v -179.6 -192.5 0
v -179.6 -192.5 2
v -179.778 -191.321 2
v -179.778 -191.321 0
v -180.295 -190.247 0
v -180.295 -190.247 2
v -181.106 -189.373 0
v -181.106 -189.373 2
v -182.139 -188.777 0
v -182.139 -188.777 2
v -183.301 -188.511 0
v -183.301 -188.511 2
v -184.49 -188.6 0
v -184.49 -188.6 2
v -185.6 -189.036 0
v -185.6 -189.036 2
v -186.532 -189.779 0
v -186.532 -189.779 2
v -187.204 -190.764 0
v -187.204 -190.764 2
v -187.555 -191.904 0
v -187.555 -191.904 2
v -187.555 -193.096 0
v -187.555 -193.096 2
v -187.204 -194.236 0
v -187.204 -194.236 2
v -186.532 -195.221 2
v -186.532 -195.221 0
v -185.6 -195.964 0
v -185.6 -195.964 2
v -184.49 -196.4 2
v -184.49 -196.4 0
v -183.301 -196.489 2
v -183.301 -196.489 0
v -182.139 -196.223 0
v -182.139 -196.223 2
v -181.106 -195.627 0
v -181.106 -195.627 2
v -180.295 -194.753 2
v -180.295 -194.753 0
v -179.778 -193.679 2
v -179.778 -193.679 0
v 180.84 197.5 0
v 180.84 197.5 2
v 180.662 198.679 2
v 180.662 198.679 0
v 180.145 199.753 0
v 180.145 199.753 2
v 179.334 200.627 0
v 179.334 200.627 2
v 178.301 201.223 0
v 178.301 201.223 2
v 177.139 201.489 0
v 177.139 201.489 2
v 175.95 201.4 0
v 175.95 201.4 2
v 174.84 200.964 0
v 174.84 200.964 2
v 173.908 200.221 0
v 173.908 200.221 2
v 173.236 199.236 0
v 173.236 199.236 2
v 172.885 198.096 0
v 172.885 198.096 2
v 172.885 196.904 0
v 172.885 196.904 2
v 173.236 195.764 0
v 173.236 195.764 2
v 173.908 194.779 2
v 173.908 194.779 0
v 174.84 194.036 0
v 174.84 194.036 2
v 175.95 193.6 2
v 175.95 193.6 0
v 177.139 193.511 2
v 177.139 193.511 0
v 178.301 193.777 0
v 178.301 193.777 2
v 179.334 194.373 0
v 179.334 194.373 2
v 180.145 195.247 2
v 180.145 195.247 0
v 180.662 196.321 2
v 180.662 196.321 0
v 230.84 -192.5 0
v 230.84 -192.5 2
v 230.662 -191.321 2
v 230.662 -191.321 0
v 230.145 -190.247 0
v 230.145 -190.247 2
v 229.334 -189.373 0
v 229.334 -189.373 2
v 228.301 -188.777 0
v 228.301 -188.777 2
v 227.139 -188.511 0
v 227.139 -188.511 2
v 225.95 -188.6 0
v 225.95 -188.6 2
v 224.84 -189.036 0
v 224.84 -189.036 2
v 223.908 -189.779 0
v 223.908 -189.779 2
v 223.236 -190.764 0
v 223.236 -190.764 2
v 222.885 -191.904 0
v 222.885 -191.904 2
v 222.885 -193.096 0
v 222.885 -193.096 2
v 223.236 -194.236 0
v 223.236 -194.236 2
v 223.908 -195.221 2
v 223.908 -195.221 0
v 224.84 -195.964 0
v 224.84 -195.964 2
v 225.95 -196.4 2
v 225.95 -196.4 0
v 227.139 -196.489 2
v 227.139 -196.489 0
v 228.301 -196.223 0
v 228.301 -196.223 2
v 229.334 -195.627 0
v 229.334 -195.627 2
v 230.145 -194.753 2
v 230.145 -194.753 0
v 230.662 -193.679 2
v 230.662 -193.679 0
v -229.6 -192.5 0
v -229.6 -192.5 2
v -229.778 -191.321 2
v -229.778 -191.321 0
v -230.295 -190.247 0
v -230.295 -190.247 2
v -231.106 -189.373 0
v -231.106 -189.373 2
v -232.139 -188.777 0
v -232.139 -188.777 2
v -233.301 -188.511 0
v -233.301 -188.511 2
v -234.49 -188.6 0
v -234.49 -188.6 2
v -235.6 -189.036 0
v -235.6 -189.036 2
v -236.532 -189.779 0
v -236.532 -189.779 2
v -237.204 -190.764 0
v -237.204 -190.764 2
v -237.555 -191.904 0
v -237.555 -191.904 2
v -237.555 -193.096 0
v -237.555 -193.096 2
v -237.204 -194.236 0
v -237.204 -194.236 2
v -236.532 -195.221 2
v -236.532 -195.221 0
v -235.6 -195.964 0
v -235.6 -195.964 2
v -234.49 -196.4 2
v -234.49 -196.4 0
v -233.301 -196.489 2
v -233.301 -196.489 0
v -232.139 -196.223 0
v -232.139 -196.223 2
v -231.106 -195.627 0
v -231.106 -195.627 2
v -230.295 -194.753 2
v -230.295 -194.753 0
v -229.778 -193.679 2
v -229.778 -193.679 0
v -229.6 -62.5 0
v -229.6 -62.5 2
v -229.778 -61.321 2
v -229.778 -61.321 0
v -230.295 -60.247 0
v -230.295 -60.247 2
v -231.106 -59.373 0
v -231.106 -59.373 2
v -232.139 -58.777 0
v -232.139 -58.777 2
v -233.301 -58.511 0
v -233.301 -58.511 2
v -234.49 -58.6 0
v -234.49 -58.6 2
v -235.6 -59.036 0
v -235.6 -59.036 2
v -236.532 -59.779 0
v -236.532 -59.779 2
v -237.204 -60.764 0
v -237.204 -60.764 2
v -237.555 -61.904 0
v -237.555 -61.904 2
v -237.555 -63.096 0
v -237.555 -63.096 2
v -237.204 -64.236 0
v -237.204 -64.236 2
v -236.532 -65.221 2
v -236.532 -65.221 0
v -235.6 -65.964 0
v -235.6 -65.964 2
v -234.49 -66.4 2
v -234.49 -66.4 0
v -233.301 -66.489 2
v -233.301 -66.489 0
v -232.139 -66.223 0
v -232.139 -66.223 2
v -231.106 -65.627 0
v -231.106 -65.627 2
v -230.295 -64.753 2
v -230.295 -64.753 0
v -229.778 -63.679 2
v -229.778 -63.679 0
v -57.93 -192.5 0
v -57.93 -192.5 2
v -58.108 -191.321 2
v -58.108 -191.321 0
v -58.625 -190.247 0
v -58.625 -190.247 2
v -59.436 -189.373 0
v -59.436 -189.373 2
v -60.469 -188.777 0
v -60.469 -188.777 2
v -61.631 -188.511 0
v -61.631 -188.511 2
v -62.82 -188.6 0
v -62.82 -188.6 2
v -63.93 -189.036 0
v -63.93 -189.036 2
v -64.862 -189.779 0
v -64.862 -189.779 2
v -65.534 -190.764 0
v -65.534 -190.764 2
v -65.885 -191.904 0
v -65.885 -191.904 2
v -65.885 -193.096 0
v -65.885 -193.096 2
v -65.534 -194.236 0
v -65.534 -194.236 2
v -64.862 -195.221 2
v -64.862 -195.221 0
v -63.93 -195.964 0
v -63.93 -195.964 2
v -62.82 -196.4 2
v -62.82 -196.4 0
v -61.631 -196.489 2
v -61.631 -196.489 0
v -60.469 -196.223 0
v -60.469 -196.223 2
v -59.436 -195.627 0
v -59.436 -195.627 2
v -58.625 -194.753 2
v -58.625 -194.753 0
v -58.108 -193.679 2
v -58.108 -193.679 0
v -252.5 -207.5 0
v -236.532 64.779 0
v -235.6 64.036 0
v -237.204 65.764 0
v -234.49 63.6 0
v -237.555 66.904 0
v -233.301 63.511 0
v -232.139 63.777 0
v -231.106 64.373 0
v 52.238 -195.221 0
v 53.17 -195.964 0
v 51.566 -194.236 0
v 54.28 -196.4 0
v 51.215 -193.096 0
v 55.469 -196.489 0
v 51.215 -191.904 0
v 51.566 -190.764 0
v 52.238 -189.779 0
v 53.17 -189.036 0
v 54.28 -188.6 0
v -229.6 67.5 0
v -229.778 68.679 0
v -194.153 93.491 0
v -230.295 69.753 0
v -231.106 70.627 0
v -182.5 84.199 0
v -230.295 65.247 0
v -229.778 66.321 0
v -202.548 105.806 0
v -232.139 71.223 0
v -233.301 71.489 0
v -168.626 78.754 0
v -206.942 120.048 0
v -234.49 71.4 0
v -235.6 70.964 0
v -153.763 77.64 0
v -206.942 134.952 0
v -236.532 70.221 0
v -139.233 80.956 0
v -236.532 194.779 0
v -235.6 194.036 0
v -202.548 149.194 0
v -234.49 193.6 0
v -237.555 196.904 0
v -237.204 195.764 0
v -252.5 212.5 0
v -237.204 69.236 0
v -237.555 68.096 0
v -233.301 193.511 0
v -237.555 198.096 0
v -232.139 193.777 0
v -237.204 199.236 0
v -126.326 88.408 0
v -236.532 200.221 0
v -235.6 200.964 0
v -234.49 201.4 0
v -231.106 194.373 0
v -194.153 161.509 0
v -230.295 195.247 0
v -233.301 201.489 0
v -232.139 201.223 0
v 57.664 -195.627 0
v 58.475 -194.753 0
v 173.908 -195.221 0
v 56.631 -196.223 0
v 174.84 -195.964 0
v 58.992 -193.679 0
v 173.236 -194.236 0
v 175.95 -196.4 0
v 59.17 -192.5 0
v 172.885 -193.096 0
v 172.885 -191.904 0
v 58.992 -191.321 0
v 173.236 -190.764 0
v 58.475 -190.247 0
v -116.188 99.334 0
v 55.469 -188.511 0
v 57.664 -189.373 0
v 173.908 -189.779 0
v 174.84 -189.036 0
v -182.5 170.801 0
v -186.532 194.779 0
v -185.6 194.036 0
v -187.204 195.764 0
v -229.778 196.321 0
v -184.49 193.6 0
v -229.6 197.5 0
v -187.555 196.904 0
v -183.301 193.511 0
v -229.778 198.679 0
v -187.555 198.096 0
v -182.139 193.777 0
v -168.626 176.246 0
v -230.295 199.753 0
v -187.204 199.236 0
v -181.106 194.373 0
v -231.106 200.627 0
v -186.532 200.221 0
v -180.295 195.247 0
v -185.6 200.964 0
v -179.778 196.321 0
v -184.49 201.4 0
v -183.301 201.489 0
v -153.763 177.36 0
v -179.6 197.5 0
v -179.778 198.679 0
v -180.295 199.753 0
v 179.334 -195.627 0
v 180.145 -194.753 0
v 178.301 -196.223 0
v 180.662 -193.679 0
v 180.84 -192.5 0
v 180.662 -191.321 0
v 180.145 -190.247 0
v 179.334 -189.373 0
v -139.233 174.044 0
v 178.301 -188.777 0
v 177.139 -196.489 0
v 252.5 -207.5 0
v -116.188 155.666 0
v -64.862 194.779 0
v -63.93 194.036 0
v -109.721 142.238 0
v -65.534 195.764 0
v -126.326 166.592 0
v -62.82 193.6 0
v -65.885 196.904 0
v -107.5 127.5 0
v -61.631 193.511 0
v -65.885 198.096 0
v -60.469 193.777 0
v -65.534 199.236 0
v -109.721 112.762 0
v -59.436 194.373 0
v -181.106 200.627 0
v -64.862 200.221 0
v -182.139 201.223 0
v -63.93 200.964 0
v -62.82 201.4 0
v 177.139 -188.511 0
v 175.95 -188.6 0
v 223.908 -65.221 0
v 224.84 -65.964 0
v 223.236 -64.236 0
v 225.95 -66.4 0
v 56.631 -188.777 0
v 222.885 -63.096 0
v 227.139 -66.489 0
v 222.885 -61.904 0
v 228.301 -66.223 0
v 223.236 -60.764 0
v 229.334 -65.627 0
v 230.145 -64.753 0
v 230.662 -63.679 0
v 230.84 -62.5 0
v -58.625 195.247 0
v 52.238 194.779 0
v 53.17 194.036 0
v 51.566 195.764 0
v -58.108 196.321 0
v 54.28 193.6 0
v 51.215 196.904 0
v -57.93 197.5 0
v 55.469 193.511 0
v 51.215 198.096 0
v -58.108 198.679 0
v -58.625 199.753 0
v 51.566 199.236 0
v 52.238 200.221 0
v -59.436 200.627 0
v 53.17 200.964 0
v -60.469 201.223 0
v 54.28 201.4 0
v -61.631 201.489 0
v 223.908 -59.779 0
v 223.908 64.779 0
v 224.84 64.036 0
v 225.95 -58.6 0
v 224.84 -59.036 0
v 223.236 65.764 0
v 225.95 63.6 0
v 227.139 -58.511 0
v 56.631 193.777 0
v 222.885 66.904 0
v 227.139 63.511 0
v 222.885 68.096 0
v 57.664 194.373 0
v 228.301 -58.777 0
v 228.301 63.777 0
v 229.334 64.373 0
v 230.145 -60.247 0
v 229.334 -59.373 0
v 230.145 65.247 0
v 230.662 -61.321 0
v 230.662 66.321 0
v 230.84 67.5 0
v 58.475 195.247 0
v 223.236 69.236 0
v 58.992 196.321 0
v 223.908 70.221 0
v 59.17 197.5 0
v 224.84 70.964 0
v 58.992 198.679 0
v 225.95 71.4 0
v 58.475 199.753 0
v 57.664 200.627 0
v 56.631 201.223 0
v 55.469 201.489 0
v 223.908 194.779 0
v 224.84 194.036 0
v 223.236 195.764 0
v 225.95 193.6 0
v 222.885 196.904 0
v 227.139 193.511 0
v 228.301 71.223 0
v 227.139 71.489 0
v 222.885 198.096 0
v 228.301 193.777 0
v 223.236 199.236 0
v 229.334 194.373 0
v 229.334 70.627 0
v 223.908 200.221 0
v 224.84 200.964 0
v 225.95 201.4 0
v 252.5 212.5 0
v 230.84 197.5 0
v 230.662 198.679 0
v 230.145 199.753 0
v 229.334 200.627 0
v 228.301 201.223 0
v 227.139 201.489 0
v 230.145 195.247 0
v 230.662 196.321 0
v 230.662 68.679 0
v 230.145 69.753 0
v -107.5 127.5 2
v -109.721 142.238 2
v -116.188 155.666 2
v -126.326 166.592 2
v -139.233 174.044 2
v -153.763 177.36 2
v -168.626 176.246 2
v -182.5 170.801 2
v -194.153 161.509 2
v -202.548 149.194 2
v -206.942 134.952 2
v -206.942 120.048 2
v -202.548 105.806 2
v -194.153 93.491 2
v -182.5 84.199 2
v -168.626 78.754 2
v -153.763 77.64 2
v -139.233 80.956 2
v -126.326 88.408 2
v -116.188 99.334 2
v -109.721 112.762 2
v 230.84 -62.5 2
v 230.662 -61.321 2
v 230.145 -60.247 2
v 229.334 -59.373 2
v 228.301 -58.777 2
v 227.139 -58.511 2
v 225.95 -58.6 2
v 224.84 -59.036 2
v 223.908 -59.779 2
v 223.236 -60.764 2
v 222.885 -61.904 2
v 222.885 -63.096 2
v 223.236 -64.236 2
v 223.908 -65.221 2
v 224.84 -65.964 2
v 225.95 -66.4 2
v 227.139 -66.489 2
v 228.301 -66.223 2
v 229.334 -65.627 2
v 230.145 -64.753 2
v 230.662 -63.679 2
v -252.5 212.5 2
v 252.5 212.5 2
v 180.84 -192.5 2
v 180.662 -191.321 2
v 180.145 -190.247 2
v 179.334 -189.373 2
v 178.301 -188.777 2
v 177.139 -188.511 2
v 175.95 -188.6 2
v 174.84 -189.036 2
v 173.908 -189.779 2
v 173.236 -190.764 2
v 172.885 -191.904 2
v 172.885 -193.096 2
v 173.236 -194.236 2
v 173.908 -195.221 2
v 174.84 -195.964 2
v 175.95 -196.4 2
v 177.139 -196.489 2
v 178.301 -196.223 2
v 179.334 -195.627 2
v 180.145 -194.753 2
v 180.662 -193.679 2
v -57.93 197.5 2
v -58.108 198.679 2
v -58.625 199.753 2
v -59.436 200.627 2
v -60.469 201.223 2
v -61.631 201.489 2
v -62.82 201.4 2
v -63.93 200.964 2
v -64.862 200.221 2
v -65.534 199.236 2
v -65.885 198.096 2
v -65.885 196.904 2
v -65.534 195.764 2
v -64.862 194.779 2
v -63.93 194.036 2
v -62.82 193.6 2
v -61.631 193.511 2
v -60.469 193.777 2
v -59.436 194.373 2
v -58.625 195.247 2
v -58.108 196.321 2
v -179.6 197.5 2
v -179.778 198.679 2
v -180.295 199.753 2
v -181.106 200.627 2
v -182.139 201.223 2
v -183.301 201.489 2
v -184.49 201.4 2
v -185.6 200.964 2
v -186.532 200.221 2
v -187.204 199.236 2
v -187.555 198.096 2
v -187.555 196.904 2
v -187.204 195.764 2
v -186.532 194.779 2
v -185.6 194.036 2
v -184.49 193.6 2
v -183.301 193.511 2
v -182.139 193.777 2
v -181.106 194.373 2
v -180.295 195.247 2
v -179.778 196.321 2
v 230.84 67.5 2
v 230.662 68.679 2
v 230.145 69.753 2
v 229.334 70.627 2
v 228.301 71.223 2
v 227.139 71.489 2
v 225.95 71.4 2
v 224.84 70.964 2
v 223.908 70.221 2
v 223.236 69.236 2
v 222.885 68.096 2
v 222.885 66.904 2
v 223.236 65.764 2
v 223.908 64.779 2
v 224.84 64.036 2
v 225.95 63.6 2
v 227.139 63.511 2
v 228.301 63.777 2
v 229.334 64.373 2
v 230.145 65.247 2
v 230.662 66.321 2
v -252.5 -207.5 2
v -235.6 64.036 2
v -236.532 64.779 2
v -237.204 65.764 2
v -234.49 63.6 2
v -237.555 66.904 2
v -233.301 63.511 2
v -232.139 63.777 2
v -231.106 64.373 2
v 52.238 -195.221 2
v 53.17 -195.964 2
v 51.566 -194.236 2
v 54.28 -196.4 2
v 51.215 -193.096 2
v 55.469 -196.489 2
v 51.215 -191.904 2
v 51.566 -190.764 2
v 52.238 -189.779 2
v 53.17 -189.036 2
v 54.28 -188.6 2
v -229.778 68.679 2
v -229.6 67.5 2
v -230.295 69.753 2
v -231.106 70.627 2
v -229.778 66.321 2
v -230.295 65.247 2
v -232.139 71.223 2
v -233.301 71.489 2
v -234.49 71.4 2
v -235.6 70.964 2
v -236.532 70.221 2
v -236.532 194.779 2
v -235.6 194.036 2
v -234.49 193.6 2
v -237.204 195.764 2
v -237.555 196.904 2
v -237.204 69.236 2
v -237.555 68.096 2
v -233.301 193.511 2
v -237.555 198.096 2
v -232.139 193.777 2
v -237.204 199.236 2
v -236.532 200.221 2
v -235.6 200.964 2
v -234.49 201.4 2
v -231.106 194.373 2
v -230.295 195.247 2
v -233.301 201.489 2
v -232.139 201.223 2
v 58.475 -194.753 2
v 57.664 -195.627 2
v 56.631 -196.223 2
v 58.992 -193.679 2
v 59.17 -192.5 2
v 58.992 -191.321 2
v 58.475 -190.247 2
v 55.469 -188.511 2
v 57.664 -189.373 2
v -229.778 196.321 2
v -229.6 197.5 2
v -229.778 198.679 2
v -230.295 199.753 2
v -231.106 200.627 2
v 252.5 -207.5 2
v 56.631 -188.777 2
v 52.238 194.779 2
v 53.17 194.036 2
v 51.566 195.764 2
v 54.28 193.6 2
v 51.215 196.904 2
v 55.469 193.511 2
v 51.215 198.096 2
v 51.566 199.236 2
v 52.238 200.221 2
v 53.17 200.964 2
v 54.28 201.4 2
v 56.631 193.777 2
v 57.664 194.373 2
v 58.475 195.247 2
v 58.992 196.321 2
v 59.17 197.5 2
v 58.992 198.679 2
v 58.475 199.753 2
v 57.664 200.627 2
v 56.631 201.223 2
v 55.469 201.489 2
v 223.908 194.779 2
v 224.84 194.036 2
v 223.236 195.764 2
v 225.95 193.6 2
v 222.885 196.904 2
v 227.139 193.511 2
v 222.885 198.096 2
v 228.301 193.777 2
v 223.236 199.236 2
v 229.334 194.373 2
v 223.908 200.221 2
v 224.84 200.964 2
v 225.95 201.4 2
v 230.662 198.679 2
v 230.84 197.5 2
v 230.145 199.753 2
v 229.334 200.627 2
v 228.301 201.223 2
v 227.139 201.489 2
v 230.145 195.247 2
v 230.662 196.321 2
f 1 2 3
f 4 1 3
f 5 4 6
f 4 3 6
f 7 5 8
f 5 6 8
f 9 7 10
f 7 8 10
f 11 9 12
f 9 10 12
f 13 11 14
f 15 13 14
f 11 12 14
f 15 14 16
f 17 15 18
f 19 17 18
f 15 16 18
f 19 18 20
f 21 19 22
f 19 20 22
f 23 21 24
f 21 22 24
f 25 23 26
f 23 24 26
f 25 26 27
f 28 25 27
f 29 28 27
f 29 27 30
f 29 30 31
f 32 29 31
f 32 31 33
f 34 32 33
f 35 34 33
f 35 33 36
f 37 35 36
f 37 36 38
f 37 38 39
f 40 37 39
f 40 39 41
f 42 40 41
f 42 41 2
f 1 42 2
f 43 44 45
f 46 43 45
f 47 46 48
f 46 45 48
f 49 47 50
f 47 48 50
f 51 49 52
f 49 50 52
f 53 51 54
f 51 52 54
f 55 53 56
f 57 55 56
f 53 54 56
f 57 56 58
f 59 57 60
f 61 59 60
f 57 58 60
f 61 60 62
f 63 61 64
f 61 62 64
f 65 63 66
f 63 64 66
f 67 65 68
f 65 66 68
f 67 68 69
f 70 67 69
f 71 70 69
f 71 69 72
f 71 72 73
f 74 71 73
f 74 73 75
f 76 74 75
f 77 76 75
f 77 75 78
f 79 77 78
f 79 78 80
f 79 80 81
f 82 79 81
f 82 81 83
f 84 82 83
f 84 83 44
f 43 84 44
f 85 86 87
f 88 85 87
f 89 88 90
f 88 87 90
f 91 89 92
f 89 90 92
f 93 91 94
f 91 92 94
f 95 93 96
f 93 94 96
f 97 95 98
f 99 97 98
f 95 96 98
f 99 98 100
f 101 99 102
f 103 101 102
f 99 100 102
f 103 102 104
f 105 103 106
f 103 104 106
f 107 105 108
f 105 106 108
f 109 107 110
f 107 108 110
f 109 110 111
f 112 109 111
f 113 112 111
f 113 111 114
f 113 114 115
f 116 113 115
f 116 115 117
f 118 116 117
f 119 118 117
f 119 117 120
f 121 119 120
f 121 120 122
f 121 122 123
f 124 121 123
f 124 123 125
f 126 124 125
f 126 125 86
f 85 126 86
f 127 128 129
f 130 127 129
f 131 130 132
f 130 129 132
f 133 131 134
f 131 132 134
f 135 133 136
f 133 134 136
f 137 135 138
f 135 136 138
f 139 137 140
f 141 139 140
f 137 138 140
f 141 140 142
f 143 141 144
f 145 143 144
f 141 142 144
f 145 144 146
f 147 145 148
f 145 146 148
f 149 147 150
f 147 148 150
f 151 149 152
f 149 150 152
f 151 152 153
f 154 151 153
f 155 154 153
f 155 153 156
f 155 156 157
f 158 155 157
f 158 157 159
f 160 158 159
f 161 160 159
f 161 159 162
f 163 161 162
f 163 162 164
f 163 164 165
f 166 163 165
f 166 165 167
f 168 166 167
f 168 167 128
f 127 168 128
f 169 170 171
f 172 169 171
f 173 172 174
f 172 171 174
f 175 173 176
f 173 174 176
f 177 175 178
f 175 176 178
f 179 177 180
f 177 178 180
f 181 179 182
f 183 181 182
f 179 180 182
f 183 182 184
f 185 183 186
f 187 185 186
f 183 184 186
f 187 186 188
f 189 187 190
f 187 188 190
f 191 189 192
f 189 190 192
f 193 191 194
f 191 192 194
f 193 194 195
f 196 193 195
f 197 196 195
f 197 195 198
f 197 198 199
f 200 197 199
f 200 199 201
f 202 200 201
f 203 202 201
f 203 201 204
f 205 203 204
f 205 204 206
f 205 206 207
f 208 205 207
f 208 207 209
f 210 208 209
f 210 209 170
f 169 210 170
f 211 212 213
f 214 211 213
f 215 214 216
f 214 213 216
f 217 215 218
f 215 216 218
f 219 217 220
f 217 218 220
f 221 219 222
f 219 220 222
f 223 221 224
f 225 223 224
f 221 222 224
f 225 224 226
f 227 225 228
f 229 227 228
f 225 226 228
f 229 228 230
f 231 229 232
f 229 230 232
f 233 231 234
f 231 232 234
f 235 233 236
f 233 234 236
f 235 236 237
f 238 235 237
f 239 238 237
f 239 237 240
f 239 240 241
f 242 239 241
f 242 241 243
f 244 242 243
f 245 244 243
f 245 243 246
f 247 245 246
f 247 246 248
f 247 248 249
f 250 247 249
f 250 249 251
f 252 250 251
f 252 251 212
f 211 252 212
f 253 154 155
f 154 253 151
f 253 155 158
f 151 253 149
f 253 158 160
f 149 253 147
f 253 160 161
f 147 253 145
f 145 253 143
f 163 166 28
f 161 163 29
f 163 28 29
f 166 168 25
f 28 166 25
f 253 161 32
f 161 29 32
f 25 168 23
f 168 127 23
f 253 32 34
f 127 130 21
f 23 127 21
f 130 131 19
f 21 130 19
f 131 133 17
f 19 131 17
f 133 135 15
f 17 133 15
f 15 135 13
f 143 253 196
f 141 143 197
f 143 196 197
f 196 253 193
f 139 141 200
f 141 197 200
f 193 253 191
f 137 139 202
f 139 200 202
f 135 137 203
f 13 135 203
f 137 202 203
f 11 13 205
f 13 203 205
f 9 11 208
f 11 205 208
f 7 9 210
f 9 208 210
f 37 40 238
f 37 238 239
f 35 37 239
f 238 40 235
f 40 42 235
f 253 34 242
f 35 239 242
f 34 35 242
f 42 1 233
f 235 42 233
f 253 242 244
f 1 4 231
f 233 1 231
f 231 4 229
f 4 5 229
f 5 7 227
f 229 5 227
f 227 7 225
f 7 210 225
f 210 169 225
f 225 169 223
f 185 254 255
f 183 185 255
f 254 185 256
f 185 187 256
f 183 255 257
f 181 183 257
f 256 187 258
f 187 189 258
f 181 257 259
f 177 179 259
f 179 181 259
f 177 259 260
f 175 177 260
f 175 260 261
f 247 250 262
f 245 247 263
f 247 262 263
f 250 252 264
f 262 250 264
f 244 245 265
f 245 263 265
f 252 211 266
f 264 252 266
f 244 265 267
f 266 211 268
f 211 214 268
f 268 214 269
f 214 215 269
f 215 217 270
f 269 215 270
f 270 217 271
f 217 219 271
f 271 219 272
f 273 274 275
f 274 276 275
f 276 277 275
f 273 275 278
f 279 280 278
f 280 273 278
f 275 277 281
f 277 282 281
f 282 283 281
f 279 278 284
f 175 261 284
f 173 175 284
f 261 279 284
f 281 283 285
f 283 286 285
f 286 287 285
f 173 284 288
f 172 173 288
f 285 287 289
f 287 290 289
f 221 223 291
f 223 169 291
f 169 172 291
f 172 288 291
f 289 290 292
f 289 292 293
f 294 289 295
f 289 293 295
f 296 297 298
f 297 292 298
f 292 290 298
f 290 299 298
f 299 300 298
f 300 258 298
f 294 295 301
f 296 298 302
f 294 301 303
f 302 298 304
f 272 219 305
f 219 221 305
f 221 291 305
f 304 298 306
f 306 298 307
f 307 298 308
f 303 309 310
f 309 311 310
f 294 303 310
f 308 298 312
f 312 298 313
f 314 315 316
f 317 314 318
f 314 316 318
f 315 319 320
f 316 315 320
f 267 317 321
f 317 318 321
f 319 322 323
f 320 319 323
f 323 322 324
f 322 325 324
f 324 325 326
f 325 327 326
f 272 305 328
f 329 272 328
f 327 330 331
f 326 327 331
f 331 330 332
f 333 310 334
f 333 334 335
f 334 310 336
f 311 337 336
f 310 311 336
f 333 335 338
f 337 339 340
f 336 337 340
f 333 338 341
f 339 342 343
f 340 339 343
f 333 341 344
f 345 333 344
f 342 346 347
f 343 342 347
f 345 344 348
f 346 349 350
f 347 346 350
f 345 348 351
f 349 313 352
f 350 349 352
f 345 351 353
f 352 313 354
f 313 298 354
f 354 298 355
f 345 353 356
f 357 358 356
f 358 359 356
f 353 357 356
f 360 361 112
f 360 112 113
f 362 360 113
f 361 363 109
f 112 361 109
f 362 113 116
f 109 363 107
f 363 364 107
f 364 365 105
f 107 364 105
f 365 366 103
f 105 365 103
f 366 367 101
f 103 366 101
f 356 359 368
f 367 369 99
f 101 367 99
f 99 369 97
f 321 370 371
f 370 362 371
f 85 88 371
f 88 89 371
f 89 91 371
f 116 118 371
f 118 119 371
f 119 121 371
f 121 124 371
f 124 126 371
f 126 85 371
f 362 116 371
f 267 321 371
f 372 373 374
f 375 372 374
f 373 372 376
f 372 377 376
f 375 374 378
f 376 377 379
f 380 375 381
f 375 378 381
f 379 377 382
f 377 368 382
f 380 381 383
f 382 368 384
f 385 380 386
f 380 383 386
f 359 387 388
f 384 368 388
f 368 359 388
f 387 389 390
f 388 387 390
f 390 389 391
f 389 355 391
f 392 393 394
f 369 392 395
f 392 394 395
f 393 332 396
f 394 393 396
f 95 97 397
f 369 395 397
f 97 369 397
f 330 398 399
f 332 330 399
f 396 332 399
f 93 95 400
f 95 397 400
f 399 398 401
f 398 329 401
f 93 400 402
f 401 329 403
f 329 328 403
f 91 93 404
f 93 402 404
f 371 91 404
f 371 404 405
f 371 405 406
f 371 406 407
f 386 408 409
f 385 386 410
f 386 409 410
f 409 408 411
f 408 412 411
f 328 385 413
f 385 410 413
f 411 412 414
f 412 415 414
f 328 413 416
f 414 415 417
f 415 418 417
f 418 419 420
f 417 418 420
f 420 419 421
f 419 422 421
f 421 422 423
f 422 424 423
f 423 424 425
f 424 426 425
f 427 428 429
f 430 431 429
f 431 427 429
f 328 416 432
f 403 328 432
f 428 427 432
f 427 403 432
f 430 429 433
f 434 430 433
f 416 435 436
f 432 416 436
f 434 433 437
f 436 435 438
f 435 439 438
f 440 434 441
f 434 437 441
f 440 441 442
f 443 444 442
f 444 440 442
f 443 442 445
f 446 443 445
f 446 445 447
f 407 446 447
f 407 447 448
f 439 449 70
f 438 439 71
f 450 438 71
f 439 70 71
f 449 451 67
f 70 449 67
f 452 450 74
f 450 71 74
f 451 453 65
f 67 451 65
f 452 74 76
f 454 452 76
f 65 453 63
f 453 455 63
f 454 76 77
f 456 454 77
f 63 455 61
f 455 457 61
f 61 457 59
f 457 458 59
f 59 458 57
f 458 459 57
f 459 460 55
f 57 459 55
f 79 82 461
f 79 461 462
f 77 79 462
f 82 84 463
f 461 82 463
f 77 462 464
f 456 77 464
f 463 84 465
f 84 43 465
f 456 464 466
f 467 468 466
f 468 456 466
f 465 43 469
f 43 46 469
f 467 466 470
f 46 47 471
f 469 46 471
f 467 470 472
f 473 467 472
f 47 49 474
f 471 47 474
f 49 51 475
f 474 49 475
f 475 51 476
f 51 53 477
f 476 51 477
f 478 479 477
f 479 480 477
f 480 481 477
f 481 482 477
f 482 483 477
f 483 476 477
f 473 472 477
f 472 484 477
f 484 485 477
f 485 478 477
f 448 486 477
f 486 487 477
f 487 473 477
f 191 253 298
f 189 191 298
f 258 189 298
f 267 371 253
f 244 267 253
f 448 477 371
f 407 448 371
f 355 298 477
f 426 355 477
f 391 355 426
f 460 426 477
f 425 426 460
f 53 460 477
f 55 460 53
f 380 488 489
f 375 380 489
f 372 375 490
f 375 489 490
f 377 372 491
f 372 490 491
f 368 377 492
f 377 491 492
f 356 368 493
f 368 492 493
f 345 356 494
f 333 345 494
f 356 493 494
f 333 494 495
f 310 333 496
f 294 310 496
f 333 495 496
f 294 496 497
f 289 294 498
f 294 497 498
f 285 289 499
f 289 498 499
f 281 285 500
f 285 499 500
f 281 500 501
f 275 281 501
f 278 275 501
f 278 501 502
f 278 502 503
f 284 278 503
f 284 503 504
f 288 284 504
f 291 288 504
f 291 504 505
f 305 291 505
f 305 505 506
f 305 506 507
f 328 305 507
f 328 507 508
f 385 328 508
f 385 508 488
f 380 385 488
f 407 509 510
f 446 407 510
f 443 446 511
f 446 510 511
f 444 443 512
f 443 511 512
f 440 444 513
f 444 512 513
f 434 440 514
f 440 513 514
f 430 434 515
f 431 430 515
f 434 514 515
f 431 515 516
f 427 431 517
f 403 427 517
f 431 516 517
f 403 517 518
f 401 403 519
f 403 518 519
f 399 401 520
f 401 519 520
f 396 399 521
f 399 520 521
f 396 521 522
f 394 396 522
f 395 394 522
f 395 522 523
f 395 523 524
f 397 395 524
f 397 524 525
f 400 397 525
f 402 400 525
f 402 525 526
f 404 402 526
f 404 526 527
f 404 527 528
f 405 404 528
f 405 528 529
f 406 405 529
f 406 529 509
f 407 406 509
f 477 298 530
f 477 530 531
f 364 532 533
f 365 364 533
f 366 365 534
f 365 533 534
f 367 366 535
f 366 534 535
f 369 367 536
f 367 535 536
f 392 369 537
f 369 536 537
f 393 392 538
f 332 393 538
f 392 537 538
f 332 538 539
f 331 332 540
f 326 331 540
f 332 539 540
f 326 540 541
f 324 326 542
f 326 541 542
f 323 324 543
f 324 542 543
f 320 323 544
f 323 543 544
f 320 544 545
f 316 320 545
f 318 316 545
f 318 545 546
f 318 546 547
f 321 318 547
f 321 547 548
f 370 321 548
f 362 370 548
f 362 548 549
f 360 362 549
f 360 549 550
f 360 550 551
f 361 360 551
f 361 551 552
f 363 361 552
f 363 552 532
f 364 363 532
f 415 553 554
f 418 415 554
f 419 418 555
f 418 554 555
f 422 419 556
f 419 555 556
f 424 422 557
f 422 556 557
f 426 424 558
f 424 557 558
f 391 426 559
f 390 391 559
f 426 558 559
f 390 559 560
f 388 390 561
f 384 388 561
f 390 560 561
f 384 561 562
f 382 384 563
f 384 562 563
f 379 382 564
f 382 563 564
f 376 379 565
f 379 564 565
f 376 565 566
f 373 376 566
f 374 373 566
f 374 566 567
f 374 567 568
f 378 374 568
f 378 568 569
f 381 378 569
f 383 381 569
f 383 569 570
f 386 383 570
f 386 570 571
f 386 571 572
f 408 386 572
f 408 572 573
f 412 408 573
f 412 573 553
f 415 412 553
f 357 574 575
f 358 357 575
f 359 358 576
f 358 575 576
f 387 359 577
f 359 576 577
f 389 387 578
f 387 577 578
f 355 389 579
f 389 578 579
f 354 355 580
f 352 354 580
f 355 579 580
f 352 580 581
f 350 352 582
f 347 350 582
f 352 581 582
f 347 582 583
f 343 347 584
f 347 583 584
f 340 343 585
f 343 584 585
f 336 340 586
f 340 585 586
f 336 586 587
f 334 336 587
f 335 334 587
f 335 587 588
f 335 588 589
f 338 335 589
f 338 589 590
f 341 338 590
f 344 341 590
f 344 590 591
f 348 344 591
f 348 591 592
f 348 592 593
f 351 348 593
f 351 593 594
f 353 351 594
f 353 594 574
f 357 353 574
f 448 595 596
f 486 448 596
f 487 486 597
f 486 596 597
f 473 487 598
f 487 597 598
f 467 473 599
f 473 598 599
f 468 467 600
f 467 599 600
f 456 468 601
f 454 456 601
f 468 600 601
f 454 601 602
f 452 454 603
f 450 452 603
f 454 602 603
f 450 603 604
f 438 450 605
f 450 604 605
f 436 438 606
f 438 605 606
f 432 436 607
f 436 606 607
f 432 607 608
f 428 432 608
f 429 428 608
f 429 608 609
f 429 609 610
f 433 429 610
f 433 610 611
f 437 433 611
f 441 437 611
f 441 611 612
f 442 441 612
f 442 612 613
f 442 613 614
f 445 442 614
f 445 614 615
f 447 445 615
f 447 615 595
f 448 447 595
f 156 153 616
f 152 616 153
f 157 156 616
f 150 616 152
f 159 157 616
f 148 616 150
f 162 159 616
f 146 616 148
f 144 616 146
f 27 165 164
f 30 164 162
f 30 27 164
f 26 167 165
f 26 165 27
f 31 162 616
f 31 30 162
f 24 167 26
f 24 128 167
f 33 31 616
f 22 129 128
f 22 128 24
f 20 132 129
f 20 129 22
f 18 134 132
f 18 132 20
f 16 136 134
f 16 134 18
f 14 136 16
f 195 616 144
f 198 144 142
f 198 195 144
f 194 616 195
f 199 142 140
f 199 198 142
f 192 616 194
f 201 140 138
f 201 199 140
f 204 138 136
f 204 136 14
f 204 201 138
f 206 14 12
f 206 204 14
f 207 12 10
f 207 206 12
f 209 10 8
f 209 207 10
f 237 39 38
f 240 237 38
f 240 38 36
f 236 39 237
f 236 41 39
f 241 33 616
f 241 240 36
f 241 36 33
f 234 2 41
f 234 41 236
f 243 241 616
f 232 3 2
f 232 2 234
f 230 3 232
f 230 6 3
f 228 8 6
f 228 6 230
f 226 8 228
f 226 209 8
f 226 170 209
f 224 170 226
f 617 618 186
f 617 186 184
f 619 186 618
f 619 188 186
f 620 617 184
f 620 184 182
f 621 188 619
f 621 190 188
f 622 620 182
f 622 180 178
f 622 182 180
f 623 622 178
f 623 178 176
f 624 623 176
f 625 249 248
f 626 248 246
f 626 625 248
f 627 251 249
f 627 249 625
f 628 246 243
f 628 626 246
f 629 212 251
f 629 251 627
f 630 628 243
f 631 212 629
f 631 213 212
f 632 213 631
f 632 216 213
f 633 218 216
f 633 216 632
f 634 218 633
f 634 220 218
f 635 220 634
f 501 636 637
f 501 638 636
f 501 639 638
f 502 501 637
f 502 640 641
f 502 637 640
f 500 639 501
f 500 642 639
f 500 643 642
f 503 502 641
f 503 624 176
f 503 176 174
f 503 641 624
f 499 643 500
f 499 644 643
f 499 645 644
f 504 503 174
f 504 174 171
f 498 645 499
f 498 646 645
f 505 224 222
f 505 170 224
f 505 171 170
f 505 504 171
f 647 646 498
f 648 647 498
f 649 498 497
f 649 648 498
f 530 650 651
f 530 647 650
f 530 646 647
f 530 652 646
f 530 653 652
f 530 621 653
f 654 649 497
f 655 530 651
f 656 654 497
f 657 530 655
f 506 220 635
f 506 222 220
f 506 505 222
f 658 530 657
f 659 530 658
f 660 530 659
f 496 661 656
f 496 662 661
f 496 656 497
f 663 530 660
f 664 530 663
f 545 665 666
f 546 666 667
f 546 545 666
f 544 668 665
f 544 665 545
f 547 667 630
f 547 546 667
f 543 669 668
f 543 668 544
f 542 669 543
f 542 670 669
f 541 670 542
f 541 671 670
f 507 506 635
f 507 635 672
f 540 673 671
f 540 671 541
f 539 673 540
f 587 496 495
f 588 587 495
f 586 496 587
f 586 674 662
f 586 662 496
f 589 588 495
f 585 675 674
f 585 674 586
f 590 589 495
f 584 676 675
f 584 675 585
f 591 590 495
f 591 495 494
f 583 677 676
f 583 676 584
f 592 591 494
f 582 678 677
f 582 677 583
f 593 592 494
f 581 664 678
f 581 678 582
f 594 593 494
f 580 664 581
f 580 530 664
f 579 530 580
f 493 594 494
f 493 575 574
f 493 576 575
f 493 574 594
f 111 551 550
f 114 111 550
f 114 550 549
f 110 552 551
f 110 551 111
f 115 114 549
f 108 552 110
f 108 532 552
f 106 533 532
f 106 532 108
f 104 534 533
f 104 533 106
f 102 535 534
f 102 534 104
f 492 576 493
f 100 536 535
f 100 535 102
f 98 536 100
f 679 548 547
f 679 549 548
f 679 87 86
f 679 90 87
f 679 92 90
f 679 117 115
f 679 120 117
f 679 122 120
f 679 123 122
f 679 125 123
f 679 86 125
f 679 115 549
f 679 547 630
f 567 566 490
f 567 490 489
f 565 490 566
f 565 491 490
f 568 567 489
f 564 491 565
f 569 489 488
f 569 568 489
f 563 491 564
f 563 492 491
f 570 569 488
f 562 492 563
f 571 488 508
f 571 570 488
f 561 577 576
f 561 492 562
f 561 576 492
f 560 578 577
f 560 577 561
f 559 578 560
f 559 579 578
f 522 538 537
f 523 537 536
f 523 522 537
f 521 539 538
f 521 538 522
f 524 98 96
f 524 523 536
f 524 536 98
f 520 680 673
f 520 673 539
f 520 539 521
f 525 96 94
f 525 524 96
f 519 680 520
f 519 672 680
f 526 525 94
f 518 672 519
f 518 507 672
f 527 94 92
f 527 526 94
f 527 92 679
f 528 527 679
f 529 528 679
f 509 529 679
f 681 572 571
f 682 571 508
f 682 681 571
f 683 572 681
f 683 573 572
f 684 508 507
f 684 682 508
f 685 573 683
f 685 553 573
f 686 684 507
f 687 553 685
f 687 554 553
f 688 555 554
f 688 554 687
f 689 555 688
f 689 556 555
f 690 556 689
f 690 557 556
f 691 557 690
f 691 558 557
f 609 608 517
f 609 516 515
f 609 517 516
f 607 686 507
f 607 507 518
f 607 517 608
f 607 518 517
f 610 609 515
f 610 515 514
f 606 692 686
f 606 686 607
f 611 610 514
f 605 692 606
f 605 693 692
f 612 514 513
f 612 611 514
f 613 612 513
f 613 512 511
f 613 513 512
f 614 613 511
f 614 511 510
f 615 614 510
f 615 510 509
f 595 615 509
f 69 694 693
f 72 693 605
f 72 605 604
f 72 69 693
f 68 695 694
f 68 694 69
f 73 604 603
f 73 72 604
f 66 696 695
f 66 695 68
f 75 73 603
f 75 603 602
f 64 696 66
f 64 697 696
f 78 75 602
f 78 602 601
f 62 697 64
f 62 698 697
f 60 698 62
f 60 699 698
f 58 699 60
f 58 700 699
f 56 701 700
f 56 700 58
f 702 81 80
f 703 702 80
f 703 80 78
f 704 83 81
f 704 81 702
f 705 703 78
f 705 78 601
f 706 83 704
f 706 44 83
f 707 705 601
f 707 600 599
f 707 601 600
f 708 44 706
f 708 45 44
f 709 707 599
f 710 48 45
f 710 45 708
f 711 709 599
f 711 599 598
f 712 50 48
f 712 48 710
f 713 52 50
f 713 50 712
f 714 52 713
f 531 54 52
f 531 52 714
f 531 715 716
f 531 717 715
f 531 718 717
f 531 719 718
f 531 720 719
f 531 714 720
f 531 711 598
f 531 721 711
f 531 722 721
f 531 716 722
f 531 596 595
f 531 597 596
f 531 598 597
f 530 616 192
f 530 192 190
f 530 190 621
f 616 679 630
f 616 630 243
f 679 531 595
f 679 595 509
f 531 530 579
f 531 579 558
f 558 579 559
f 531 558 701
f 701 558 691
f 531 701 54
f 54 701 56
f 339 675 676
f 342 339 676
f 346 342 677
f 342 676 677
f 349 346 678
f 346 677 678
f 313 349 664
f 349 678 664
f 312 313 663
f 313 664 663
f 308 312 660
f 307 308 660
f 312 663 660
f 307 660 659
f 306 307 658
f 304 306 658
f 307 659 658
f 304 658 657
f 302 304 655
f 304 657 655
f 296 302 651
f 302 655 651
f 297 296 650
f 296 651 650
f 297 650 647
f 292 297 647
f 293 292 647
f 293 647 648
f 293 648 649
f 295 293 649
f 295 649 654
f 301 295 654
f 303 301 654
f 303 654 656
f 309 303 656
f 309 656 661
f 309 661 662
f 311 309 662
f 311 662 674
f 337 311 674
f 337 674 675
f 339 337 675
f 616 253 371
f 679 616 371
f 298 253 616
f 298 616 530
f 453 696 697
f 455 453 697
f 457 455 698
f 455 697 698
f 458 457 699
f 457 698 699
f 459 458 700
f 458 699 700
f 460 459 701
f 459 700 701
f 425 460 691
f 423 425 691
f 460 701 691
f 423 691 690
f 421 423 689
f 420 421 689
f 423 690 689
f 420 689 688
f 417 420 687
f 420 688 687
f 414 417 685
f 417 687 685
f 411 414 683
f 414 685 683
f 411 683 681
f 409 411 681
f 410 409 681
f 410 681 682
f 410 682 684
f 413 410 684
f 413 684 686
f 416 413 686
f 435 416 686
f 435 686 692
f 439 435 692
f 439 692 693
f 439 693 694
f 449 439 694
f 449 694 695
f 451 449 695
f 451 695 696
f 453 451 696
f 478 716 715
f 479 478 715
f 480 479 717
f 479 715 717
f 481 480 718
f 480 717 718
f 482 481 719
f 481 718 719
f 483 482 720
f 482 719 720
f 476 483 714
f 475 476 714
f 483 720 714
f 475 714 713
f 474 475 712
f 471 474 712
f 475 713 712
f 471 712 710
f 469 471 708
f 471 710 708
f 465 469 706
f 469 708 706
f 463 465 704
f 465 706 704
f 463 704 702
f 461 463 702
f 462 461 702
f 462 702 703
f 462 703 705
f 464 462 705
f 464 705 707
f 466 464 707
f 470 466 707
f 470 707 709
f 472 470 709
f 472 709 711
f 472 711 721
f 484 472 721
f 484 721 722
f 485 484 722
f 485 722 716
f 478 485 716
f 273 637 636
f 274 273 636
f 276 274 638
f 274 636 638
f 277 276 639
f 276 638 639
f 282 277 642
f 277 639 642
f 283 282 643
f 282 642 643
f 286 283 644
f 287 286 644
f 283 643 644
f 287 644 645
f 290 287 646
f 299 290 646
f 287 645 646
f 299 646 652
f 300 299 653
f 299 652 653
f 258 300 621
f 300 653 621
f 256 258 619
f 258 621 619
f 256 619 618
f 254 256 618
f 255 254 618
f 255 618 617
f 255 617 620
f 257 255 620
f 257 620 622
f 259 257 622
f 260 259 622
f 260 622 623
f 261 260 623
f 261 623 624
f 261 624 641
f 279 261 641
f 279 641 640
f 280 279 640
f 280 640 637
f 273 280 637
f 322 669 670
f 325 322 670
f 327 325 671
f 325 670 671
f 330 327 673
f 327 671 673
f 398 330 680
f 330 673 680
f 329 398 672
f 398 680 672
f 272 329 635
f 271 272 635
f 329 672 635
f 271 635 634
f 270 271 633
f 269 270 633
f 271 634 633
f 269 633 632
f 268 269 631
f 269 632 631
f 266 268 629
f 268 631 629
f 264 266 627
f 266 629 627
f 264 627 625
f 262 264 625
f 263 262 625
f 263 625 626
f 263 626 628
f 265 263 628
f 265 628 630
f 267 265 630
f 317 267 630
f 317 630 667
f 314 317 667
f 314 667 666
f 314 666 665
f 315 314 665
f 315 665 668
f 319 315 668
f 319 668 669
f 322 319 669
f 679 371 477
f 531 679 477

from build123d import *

# Parameters (mm, degrees)
ESQUISSE1_W             = 505
ESQUISSE1_H             = 420
BOSS_EXTRU_1_DEPTH      = 2
ESQUISSE2_R             = 50
ENL_V_MAT_EXTRU_1_DEPTH = 10
ESQUISSE3_R             = 4
ENL_V_MAT_EXTRU_2_DEPTH = 10


with BuildPart() as part:
    # Esquisse1 → Boss.-Extru.1 (new body)
    with BuildSketch(Plane.XY):
        with Locations((0, 2.5)):
            Rectangle(ESQUISSE1_W, ESQUISSE1_H)
    extrude(amount=BOSS_EXTRU_1_DEPTH)

    # Esquisse2 → Enlèv. mat.-Extru.1 (cut)
    with BuildSketch(Plane.XY.offset(2)):
        with Locations((-157.5, 127.5)):
            Circle(ESQUISSE2_R)
    extrude(amount=-ENL_V_MAT_EXTRU_1_DEPTH, mode=Mode.SUBTRACT)

    # Esquisse3 → Enlèv. mat.-Extru.2 (cut)
    with BuildSketch(Plane.XY.offset(2)):
        with Locations((-233.6, 197.5)):
            Circle(ESQUISSE3_R)
        with Locations((-183.6, 197.5)):
            Circle(ESQUISSE3_R)
        with Locations((-61.93, 197.5)):
            Circle(ESQUISSE3_R)
        with Locations((55.17, 197.5)):
            Circle(ESQUISSE3_R)
        with Locations((176.84, 197.5)):
            Circle(ESQUISSE3_R)
        with Locations((226.84, 197.5)):
            Circle(ESQUISSE3_R)
        with Locations((226.84, 67.5)):
            Circle(ESQUISSE3_R)
        with Locations((226.84, -62.5)):
            Circle(ESQUISSE3_R)
        with Locations((226.84, -192.5)):
            Circle(ESQUISSE3_R)
        with Locations((176.84, -192.5)):
            Circle(ESQUISSE3_R)
        with Locations((55.17, -192.5)):
            Circle(ESQUISSE3_R)
        with Locations((-61.93, -192.5)):
            Circle(ESQUISSE3_R)
        with Locations((-183.6, -192.5)):
            Circle(ESQUISSE3_R)
        with Locations((-233.6, -192.5)):
            Circle(ESQUISSE3_R)
        with Locations((-233.6, -62.5)):
            Circle(ESQUISSE3_R)
        with Locations((-233.6, 67.5)):
            Circle(ESQUISSE3_R)
    extrude(amount=-ENL_V_MAT_EXTRU_2_DEPTH, mode=Mode.SUBTRACT)


solid = part.part
